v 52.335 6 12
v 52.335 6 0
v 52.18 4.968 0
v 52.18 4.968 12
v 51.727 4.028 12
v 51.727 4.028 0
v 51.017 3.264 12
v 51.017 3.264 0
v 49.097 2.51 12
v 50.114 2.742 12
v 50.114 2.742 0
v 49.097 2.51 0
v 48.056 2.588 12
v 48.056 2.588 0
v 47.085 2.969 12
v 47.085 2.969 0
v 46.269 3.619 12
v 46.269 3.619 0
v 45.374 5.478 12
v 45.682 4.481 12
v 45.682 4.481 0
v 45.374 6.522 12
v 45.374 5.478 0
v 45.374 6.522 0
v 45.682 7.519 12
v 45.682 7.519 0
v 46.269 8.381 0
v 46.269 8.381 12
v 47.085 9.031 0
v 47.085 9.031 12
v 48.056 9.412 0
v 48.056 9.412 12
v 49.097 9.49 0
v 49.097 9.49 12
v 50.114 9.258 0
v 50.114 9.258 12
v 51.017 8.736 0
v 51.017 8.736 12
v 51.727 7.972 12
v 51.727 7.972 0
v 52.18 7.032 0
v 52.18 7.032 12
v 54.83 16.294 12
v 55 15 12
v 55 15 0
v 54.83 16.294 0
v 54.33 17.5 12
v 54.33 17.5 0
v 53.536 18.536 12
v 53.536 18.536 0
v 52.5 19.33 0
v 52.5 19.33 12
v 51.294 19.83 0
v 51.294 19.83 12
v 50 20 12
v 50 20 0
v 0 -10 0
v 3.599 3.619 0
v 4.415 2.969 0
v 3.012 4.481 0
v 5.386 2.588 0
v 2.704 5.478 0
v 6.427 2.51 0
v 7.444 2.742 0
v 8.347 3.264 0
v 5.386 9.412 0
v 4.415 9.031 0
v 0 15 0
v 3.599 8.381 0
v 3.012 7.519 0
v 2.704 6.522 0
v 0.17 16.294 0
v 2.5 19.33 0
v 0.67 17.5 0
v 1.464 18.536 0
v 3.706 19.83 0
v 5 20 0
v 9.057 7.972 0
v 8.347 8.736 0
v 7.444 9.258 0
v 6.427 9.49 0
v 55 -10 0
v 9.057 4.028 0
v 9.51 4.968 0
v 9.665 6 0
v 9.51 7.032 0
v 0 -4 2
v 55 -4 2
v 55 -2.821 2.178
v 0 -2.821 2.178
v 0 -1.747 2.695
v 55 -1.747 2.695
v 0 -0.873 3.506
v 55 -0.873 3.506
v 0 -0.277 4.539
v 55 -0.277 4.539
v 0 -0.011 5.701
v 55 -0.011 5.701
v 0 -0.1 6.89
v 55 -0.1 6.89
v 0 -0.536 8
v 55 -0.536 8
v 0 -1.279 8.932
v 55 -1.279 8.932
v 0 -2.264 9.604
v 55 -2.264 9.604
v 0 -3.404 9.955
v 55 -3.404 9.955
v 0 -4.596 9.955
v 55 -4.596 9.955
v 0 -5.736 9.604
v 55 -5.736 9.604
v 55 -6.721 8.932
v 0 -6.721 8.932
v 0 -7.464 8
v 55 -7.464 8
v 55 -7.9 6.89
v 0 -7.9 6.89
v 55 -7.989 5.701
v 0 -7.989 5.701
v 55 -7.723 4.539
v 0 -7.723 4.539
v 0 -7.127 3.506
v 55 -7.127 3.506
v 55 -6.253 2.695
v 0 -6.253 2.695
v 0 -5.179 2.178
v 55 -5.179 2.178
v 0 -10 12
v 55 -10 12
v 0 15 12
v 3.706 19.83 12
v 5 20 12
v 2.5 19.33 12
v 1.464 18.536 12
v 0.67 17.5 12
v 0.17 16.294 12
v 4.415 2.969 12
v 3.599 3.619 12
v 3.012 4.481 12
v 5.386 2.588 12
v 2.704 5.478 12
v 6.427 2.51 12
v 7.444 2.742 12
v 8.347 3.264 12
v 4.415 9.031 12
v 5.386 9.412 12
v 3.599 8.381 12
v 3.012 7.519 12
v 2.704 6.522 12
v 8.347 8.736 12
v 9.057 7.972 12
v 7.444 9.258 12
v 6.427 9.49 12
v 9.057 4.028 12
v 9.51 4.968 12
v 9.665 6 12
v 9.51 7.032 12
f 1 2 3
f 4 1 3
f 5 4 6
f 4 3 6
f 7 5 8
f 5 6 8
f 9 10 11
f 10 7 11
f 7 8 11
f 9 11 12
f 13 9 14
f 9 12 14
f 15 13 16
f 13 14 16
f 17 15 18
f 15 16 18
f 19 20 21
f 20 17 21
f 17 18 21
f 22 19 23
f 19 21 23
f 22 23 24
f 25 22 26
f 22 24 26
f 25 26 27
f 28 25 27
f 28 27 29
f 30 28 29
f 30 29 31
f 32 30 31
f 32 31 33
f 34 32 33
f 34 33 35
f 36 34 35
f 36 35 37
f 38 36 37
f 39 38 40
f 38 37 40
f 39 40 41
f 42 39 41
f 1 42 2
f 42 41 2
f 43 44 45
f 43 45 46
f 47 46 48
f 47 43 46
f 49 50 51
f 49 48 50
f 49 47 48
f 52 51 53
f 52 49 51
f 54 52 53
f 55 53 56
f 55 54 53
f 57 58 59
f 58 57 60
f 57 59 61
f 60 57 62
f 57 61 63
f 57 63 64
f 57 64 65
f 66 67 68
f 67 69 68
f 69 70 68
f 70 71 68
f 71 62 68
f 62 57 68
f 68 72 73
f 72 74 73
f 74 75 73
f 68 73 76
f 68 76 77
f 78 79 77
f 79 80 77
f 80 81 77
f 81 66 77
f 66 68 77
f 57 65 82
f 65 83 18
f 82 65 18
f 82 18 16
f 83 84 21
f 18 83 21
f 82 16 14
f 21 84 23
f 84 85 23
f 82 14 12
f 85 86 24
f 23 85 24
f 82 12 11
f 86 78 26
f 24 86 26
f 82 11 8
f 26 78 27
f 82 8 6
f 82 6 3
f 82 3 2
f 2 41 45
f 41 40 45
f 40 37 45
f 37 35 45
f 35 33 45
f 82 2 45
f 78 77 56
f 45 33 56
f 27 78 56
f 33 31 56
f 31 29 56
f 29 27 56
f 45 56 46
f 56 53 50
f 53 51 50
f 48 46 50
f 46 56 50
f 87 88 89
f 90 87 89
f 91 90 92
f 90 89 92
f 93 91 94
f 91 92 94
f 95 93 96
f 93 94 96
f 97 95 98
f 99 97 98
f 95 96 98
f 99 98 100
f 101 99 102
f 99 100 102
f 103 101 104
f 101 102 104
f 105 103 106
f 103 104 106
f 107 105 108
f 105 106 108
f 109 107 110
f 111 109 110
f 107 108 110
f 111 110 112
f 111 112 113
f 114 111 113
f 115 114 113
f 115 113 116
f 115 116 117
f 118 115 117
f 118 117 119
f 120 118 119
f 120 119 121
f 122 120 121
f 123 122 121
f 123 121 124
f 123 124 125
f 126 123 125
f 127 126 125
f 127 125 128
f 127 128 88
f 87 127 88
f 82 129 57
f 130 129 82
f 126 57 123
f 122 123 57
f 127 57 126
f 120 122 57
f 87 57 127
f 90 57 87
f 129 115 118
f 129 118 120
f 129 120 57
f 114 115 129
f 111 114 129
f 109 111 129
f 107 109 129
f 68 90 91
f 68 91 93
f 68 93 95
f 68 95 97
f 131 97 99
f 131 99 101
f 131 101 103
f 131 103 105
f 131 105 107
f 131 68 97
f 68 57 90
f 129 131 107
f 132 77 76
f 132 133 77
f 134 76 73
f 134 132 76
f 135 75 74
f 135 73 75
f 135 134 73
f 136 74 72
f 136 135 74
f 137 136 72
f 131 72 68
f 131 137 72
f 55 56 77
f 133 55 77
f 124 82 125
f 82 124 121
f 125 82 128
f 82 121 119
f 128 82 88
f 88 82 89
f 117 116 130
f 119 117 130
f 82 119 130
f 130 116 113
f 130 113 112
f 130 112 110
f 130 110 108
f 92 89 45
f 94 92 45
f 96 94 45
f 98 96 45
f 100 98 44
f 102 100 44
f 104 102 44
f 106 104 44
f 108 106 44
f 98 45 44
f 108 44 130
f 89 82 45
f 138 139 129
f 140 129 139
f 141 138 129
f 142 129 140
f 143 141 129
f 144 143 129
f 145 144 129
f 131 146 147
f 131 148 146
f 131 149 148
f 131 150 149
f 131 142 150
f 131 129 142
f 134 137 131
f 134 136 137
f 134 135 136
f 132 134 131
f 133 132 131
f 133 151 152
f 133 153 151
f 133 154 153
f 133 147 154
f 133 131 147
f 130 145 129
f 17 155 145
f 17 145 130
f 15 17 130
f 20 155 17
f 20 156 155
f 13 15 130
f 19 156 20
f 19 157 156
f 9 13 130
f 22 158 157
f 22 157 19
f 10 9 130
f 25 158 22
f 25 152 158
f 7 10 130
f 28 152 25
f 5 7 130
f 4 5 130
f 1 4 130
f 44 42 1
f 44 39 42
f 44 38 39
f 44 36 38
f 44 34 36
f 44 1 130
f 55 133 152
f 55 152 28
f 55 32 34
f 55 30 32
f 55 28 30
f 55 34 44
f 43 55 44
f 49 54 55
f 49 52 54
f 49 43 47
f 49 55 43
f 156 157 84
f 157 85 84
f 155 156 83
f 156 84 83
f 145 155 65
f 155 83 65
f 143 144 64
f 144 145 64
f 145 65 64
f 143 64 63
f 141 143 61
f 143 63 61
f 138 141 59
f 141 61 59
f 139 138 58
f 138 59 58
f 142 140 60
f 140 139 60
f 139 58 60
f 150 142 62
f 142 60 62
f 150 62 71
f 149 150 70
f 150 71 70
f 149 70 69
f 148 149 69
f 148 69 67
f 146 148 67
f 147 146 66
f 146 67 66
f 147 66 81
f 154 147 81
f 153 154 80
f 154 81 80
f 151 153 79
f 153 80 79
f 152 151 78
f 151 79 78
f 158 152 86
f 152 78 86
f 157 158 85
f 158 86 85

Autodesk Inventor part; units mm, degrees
ref_plane "YZ Plane" through (0, 0, 0) normal (1, 0, 0) x (0, 1, 0)
ref_plane "XZ Plane" through (0, 0, 0) normal (0, 1, 0) x (-1, 0, 0)
ref_plane "XY Plane" through (0, 0, 0) normal (0, 0, 1) x (1, 0, 0)
sketch "Boceto1" plane through (0, 0, 0) normal (0, 0, 1) x (1, 0, 0)
  line L0 (0, 0) -> (55, 0)
  line L1 (55, 0) -> (55, 20)
  line L2 (55, 20) -> (0, 20)
  line L3 (0, 20) -> (0, 0)
  circle A0 centre (6.165, 6) radius 3.5
  line L4 (27.5, 20) -> (27.5, 0)
  circle A1 centre (48.835, 6) radius 3.5
  dimension "d0" = 7
  dimension "d1" = 55
  dimension "d3" = 20
  dimension "d23" = 42.67
  dimension "d32" = 6
extrude "Extrusión1" add sketch "Boceto1" along normal blind 12
fillet "Empalme1" radius 5 2 edges at (55, 20, 6) (0, 20, 6)
sketch "Boceto7" plane through (0, 0, 0) normal (0, -1, 0) x (1, 0, 0)
  line L0 (0, 0) -> (0, 12) projected
  line L1 (0, 12) -> (55, 12) projected
  line L2 (0, 0) -> (55, 0)
  line L3 (55, 0) -> (55, 12)
  line L4 (55, 12) -> (0, 12)
  line L5 (0, 12) -> (0, 0)
extrude "Extrusión5" add sketch "Boceto7" along normal blind 10
sketch "Boceto8" plane through (55, 15, 12) normal (1, 0, 0) x (0, 0, -1)
  circle A0 centre (6, -19) radius 4
  line L0 (12, -25) -> (0, -25) projected
  line L1 (12, 0) -> (12, -25) projected
  point P0 (12, -15)
  point P1 (6, -25)
  dimension "d26" = 8
  dimension "d27" = 6
extrude "Extrusión6" cut sketch "Boceto8" against normal blind 55
properties part number "SoporteDerecha"
